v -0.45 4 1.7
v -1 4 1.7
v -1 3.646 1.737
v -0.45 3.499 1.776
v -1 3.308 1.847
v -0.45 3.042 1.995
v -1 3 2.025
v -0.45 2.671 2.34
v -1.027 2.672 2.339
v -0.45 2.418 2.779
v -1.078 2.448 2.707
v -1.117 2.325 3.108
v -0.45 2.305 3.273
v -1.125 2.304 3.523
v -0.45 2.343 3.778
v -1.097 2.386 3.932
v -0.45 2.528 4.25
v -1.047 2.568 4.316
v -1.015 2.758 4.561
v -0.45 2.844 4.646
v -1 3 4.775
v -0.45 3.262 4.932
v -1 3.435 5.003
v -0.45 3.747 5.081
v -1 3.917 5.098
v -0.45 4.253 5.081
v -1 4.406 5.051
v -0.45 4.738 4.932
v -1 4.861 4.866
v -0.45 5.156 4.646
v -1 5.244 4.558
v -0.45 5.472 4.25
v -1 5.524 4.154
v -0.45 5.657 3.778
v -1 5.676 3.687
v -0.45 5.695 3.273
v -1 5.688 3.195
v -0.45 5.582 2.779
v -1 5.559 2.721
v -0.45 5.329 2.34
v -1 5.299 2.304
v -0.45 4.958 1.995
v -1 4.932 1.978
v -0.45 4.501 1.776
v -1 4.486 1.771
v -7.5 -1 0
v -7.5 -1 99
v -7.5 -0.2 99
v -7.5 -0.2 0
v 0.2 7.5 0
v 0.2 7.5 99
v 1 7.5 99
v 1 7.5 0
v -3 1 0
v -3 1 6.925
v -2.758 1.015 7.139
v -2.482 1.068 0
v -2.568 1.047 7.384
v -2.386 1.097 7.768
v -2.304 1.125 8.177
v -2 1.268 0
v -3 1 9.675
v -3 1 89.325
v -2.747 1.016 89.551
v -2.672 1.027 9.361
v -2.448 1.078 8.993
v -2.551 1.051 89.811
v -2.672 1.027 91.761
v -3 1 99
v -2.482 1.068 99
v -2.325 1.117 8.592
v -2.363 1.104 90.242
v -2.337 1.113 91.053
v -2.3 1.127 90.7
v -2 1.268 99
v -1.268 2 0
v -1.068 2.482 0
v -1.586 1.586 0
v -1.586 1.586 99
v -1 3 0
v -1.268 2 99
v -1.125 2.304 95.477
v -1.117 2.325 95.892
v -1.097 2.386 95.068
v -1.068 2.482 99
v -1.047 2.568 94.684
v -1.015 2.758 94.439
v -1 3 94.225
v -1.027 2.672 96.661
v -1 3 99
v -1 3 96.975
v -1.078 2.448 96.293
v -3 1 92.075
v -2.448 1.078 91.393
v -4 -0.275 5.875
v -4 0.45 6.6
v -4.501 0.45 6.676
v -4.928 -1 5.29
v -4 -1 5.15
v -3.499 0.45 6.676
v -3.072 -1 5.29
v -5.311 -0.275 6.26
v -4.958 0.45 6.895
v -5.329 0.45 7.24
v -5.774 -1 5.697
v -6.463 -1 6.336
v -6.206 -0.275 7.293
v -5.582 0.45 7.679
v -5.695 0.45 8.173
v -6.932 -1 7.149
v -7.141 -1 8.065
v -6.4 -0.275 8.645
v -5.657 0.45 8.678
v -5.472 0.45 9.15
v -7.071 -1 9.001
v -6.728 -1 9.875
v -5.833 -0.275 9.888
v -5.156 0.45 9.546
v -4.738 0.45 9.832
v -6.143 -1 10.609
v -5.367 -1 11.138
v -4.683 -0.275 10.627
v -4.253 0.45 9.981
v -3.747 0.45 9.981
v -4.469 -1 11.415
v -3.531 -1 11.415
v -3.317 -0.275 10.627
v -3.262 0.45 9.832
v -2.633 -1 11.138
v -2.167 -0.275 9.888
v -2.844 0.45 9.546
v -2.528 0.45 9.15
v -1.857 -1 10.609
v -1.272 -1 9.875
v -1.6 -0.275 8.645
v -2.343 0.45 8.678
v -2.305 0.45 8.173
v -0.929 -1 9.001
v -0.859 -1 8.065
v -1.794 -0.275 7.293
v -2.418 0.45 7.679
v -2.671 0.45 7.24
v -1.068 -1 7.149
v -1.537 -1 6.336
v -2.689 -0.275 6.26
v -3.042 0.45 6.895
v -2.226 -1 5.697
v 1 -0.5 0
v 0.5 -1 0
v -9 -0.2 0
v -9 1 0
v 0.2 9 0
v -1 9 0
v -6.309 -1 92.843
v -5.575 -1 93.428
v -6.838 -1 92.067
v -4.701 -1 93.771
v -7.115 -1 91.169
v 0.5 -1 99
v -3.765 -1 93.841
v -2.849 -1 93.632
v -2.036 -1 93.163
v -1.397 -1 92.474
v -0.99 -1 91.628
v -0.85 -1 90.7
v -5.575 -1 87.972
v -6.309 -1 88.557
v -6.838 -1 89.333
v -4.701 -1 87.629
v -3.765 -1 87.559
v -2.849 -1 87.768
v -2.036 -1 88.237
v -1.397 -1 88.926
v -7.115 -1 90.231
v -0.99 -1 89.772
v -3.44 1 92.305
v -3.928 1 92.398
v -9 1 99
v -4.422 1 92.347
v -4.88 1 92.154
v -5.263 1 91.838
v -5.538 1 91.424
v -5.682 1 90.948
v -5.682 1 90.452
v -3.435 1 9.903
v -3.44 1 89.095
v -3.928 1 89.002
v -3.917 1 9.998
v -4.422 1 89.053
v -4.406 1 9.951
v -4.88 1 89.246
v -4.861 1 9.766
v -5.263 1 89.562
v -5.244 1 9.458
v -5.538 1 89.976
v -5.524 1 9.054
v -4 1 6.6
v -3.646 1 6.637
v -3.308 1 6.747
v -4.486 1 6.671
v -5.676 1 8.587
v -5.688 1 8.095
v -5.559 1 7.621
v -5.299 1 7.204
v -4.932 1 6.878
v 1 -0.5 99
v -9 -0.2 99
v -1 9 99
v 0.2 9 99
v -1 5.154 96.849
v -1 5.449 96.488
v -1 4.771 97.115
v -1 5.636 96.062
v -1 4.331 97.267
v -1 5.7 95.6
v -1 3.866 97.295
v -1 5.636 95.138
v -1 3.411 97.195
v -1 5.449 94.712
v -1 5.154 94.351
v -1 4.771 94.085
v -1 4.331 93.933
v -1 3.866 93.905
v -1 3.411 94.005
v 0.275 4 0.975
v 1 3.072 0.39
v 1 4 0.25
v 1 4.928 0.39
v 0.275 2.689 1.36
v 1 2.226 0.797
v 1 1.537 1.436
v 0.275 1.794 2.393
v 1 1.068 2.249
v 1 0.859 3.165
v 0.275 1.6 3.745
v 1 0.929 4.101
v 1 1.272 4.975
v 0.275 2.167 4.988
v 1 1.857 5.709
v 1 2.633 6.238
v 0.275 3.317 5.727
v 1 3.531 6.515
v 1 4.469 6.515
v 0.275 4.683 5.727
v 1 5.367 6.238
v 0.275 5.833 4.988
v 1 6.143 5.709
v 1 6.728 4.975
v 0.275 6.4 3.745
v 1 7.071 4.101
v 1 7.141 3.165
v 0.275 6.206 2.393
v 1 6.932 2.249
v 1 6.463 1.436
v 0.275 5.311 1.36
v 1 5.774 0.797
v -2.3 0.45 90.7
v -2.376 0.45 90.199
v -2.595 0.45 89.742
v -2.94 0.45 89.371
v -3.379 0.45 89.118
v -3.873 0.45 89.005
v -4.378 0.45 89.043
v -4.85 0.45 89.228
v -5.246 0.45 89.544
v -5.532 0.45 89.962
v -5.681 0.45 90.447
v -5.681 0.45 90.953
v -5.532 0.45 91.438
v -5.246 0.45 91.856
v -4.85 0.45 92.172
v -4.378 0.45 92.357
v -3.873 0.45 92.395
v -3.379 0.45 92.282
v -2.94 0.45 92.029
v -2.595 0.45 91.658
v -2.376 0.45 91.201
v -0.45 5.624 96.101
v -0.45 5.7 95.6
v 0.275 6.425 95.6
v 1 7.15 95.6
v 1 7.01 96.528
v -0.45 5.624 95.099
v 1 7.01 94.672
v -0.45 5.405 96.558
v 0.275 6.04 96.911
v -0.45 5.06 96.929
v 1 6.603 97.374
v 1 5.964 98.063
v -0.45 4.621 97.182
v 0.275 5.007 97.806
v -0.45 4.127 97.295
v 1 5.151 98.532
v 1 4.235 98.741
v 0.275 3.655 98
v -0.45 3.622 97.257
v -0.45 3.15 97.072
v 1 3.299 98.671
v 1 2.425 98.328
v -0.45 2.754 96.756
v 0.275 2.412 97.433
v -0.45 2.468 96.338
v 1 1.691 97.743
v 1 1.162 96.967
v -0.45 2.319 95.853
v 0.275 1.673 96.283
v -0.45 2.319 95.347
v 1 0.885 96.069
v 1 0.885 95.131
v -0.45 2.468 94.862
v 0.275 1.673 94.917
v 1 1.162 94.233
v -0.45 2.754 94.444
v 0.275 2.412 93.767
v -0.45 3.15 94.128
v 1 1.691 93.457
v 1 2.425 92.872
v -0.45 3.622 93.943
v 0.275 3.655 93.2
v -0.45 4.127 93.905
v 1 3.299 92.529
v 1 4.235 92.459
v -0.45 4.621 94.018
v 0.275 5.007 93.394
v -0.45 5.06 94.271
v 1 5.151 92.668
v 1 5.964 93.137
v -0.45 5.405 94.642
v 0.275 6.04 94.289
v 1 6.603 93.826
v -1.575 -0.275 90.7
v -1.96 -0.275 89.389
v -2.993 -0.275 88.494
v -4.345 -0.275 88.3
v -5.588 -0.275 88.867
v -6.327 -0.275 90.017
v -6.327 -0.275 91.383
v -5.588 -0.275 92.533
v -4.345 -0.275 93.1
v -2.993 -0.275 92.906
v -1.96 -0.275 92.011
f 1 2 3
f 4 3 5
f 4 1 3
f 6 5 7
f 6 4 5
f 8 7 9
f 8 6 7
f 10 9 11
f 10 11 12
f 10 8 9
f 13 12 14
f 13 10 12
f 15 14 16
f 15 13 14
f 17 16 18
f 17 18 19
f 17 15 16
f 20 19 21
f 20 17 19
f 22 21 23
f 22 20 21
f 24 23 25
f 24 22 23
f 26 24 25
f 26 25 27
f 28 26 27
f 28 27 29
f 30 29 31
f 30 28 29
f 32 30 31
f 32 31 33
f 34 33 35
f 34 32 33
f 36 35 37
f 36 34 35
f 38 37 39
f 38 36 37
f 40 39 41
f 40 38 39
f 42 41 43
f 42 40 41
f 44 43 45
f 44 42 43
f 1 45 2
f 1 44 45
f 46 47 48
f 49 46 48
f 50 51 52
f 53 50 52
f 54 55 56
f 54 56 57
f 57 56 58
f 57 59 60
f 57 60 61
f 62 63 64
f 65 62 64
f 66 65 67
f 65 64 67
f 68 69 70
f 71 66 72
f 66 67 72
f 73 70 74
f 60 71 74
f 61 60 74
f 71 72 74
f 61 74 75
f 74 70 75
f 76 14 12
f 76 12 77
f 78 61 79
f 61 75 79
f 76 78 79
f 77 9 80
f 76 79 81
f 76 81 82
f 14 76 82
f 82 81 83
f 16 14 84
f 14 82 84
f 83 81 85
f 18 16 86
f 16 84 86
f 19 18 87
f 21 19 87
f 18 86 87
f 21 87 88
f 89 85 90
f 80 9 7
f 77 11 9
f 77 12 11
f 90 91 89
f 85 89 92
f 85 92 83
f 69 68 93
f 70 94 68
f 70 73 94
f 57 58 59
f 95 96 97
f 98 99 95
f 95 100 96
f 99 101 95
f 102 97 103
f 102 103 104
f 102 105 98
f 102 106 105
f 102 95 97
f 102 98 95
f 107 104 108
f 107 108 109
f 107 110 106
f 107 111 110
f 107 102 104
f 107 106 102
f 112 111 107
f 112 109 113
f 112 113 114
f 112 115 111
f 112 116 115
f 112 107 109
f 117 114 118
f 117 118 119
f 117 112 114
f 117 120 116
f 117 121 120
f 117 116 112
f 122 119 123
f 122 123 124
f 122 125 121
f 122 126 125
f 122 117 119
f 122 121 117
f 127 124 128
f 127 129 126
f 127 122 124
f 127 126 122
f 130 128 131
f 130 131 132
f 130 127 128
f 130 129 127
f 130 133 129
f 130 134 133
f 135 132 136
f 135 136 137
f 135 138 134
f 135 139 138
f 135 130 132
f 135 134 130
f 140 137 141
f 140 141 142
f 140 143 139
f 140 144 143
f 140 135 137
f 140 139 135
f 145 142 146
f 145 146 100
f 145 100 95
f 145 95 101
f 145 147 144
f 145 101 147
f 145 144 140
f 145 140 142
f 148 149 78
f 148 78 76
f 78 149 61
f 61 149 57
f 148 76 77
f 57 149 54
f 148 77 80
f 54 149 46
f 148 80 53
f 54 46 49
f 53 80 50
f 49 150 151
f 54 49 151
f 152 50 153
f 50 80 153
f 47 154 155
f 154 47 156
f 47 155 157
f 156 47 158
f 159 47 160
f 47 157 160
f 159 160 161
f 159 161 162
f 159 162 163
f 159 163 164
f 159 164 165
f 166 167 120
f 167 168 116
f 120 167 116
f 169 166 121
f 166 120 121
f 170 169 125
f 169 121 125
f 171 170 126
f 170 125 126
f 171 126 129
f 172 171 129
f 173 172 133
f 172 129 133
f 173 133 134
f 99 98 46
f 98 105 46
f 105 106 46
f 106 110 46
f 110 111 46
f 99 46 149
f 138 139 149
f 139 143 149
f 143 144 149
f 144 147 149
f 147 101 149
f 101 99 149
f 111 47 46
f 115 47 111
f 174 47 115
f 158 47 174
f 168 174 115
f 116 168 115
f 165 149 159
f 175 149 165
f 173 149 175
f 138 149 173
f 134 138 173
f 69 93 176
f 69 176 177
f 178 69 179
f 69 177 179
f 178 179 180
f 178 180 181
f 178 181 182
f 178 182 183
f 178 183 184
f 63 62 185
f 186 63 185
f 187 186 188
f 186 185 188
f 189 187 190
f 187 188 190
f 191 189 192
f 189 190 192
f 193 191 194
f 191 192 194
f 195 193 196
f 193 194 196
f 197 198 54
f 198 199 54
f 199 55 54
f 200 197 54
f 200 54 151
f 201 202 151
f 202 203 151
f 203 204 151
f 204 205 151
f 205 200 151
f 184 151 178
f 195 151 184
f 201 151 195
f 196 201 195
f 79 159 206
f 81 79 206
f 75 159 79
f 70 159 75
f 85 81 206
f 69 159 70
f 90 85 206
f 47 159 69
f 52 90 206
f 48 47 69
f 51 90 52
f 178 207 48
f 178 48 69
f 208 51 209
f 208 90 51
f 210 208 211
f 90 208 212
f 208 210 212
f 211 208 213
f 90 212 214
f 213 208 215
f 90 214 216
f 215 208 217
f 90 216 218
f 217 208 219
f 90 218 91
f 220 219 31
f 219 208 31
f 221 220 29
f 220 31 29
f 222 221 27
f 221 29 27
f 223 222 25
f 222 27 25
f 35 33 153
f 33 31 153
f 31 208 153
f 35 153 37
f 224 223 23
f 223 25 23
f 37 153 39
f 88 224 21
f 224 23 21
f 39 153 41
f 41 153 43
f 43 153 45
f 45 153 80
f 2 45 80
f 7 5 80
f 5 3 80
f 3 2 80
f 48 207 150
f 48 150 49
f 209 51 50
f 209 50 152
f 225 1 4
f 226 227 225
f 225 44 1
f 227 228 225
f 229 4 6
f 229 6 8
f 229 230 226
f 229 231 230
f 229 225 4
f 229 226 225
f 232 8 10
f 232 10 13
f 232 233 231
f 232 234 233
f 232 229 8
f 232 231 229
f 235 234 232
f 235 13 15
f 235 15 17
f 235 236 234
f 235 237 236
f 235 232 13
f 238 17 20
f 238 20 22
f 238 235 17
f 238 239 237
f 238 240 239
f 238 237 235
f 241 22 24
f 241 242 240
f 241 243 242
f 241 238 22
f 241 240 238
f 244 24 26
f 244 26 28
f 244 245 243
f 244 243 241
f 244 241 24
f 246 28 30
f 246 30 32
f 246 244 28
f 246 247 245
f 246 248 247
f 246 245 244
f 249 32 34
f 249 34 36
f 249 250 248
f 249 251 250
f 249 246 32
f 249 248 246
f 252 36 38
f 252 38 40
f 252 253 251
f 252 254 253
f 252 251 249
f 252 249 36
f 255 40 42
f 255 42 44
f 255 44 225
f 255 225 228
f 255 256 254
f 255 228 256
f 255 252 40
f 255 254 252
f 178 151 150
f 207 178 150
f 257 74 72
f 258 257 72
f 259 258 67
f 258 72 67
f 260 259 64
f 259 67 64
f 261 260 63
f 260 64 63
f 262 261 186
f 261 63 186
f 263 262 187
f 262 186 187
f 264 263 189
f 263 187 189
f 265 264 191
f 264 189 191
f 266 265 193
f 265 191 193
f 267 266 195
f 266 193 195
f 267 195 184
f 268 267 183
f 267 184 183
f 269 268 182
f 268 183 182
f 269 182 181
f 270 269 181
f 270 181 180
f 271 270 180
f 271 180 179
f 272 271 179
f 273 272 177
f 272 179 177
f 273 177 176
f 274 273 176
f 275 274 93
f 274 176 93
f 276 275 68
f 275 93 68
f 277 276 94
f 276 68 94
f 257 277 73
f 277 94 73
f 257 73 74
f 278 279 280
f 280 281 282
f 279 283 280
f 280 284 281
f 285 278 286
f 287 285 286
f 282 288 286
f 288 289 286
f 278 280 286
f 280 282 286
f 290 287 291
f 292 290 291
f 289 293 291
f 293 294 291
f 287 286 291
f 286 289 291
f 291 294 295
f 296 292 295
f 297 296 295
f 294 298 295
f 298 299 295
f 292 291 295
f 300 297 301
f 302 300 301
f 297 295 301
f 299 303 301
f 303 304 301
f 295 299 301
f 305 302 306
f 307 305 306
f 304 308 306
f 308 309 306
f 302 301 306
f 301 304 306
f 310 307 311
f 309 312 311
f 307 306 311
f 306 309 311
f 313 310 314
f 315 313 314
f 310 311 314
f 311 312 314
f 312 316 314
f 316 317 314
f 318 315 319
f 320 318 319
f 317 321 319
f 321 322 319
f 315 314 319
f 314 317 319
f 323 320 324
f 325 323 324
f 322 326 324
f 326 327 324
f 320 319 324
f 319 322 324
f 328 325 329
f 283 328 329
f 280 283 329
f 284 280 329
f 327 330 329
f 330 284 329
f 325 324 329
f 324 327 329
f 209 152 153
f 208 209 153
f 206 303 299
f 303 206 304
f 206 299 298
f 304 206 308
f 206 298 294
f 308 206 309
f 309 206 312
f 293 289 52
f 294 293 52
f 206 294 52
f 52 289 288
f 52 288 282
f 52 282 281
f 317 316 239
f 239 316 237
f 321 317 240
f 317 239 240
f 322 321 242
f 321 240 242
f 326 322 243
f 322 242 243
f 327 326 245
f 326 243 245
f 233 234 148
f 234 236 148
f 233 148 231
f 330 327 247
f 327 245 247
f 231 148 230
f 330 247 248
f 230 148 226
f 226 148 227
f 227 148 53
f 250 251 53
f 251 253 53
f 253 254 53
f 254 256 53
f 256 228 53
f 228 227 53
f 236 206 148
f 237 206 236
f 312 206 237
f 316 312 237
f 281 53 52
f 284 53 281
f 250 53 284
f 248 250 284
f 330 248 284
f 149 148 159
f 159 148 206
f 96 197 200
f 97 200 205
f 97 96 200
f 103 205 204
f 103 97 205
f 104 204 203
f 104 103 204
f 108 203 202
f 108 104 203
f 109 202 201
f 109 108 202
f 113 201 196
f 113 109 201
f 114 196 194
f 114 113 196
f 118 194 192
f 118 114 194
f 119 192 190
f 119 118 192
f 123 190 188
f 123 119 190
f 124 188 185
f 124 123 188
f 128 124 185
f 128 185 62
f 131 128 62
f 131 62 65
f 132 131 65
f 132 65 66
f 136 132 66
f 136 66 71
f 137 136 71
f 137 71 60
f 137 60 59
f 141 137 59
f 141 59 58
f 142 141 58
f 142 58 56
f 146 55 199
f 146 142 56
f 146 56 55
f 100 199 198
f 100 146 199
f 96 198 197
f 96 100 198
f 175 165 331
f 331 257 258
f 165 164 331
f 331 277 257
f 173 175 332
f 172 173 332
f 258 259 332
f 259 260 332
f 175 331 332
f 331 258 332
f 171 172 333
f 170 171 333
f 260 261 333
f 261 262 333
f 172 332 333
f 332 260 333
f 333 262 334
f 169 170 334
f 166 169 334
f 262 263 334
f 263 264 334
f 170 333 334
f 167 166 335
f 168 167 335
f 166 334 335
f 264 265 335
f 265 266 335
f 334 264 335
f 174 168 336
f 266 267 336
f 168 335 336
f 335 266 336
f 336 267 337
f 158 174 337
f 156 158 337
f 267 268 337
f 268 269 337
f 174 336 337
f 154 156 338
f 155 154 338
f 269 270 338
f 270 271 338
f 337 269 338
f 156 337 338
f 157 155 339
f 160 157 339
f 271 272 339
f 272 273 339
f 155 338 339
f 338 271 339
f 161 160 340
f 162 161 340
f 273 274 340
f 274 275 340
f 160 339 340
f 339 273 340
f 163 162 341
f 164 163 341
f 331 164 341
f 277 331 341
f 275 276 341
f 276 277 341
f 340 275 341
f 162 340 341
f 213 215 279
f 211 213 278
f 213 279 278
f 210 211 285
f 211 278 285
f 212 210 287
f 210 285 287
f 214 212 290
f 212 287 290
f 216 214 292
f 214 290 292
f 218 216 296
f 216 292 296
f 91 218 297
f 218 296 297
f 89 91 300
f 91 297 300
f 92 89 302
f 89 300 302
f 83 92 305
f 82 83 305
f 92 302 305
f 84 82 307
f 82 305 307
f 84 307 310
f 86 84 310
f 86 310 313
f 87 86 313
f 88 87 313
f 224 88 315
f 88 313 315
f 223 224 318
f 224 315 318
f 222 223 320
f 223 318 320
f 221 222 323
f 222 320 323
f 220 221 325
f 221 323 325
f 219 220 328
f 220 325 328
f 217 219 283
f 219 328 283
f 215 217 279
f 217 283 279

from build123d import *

# Parameters (mm, degrees)
EXTRUDE_THIN1_DEPTH = 99
CHAMFER1_SIZE       = 0.5
FILLET1_R           = 2
SKETCH2_W           = 1.5
SKETCH2_H           = 0.8
SKETCH2_W_2         = 0.8
SKETCH2_H_2         = 1.5
CUT_EXTRUDE1_DEPTH  = 100.814828558


# Read off the part's stored shape, not the designer's step: Mirror1
with BuildPart() as part:
    # Sketch1 → Extrude-Thin1 (new body)
    with BuildSketch(Plane(origin=(0, 0, 0), x_dir=(0, 1, 0), z_dir=(0, 0, 1))):
        Polygon((9, 1), (1, 1), (1, 9), (-1, 9), (-1, -1), (9, -1), align=None)
    extrude(amount=EXTRUDE_THIN1_DEPTH)

    # Chamfer1
    chamfer1_edges = [part.edges().sort_by_distance(p)[0] for p in [
        (1, -1, 49.5),
    ]]
    chamfer(chamfer1_edges, length=CHAMFER1_SIZE)

    # Fillet1
    fillet1_edges = [part.edges().sort_by_distance(p)[0] for p in [
        (-1, 1, 49.5),
    ]]
    fillet(fillet1_edges, radius=FILLET1_R)

    # Sketch2 → Cut-Extrude1 (cut, through all)
    with BuildSketch(Plane.XY.offset(99)):
        with Locations((-8.25, -0.6)):
            Rectangle(SKETCH2_W, SKETCH2_H)
        with Locations((0.6, 8.25)):
            Rectangle(SKETCH2_W_2, SKETCH2_H_2)
    extrude(amount=-CUT_EXTRUDE1_DEPTH, mode=Mode.SUBTRACT)

    # Sketch5 → CSK for M3 Flat Head Machine Screw1 (revolve, cut)
    with BuildSketch(Plane(origin=(1, 4, 3.4), x_dir=(0, 0, -1), z_dir=(0, 1, 0))):
        Polygon((0, 0), (0, 10), (1.7, 10), (1.7, 1.45), (3.15, 0), align=None)
    revolve(axis=Axis((7.35, 4, 3.4), (-1, 0, 0)), mode=Mode.SUBTRACT)

    # Sketch5 at point 2 (carried to point 2, square into its face) → CSK for M3 Flat Head Machine Screw1 at 2 (revolve, cut)
    with BuildSketch(Plane(origin=(-4, -1, 8.3), x_dir=(0, 0, -1), z_dir=(1, 0, 0))):
        Polygon((0, 0), (0, 10), (1.7, 10), (1.7, 1.45), (3.15, 0), align=None)
    revolve(axis=Axis((-4, -7.35, 8.3), (0, 1, 0)), mode=Mode.SUBTRACT)

    # Mirror1 outline → Mirror1 (revolve, cut)
    with BuildSketch(Plane(origin=(-4, 0, 90.7), x_dir=(1, 0, 0), z_dir=(0, 0, 1))):
        Polygon((1.7, 0.45), (1.7, 1.126574026), (0, 1.126574026), (0, -1), (3.15, -1), align=None)
    revolve(axis=Axis((-4, 0, 90.7), (0, 1, 0)), mode=Mode.SUBTRACT)

    # Mirror1 2 outline → Mirror1 2 (revolve, cut)
    with BuildSketch(Plane(origin=(0, 4, 95.6), x_dir=(0, 1, 0), z_dir=(0, 0, -1))):
        Polygon((0, -1.126574026), (1.7, -1.126574026), (1.7, -0.45), (3.15, 1), (0, 1), align=None)
    revolve(axis=Axis((0, 4, 95.6), (1, 0, 0)), mode=Mode.SUBTRACT)


solid = part.part
